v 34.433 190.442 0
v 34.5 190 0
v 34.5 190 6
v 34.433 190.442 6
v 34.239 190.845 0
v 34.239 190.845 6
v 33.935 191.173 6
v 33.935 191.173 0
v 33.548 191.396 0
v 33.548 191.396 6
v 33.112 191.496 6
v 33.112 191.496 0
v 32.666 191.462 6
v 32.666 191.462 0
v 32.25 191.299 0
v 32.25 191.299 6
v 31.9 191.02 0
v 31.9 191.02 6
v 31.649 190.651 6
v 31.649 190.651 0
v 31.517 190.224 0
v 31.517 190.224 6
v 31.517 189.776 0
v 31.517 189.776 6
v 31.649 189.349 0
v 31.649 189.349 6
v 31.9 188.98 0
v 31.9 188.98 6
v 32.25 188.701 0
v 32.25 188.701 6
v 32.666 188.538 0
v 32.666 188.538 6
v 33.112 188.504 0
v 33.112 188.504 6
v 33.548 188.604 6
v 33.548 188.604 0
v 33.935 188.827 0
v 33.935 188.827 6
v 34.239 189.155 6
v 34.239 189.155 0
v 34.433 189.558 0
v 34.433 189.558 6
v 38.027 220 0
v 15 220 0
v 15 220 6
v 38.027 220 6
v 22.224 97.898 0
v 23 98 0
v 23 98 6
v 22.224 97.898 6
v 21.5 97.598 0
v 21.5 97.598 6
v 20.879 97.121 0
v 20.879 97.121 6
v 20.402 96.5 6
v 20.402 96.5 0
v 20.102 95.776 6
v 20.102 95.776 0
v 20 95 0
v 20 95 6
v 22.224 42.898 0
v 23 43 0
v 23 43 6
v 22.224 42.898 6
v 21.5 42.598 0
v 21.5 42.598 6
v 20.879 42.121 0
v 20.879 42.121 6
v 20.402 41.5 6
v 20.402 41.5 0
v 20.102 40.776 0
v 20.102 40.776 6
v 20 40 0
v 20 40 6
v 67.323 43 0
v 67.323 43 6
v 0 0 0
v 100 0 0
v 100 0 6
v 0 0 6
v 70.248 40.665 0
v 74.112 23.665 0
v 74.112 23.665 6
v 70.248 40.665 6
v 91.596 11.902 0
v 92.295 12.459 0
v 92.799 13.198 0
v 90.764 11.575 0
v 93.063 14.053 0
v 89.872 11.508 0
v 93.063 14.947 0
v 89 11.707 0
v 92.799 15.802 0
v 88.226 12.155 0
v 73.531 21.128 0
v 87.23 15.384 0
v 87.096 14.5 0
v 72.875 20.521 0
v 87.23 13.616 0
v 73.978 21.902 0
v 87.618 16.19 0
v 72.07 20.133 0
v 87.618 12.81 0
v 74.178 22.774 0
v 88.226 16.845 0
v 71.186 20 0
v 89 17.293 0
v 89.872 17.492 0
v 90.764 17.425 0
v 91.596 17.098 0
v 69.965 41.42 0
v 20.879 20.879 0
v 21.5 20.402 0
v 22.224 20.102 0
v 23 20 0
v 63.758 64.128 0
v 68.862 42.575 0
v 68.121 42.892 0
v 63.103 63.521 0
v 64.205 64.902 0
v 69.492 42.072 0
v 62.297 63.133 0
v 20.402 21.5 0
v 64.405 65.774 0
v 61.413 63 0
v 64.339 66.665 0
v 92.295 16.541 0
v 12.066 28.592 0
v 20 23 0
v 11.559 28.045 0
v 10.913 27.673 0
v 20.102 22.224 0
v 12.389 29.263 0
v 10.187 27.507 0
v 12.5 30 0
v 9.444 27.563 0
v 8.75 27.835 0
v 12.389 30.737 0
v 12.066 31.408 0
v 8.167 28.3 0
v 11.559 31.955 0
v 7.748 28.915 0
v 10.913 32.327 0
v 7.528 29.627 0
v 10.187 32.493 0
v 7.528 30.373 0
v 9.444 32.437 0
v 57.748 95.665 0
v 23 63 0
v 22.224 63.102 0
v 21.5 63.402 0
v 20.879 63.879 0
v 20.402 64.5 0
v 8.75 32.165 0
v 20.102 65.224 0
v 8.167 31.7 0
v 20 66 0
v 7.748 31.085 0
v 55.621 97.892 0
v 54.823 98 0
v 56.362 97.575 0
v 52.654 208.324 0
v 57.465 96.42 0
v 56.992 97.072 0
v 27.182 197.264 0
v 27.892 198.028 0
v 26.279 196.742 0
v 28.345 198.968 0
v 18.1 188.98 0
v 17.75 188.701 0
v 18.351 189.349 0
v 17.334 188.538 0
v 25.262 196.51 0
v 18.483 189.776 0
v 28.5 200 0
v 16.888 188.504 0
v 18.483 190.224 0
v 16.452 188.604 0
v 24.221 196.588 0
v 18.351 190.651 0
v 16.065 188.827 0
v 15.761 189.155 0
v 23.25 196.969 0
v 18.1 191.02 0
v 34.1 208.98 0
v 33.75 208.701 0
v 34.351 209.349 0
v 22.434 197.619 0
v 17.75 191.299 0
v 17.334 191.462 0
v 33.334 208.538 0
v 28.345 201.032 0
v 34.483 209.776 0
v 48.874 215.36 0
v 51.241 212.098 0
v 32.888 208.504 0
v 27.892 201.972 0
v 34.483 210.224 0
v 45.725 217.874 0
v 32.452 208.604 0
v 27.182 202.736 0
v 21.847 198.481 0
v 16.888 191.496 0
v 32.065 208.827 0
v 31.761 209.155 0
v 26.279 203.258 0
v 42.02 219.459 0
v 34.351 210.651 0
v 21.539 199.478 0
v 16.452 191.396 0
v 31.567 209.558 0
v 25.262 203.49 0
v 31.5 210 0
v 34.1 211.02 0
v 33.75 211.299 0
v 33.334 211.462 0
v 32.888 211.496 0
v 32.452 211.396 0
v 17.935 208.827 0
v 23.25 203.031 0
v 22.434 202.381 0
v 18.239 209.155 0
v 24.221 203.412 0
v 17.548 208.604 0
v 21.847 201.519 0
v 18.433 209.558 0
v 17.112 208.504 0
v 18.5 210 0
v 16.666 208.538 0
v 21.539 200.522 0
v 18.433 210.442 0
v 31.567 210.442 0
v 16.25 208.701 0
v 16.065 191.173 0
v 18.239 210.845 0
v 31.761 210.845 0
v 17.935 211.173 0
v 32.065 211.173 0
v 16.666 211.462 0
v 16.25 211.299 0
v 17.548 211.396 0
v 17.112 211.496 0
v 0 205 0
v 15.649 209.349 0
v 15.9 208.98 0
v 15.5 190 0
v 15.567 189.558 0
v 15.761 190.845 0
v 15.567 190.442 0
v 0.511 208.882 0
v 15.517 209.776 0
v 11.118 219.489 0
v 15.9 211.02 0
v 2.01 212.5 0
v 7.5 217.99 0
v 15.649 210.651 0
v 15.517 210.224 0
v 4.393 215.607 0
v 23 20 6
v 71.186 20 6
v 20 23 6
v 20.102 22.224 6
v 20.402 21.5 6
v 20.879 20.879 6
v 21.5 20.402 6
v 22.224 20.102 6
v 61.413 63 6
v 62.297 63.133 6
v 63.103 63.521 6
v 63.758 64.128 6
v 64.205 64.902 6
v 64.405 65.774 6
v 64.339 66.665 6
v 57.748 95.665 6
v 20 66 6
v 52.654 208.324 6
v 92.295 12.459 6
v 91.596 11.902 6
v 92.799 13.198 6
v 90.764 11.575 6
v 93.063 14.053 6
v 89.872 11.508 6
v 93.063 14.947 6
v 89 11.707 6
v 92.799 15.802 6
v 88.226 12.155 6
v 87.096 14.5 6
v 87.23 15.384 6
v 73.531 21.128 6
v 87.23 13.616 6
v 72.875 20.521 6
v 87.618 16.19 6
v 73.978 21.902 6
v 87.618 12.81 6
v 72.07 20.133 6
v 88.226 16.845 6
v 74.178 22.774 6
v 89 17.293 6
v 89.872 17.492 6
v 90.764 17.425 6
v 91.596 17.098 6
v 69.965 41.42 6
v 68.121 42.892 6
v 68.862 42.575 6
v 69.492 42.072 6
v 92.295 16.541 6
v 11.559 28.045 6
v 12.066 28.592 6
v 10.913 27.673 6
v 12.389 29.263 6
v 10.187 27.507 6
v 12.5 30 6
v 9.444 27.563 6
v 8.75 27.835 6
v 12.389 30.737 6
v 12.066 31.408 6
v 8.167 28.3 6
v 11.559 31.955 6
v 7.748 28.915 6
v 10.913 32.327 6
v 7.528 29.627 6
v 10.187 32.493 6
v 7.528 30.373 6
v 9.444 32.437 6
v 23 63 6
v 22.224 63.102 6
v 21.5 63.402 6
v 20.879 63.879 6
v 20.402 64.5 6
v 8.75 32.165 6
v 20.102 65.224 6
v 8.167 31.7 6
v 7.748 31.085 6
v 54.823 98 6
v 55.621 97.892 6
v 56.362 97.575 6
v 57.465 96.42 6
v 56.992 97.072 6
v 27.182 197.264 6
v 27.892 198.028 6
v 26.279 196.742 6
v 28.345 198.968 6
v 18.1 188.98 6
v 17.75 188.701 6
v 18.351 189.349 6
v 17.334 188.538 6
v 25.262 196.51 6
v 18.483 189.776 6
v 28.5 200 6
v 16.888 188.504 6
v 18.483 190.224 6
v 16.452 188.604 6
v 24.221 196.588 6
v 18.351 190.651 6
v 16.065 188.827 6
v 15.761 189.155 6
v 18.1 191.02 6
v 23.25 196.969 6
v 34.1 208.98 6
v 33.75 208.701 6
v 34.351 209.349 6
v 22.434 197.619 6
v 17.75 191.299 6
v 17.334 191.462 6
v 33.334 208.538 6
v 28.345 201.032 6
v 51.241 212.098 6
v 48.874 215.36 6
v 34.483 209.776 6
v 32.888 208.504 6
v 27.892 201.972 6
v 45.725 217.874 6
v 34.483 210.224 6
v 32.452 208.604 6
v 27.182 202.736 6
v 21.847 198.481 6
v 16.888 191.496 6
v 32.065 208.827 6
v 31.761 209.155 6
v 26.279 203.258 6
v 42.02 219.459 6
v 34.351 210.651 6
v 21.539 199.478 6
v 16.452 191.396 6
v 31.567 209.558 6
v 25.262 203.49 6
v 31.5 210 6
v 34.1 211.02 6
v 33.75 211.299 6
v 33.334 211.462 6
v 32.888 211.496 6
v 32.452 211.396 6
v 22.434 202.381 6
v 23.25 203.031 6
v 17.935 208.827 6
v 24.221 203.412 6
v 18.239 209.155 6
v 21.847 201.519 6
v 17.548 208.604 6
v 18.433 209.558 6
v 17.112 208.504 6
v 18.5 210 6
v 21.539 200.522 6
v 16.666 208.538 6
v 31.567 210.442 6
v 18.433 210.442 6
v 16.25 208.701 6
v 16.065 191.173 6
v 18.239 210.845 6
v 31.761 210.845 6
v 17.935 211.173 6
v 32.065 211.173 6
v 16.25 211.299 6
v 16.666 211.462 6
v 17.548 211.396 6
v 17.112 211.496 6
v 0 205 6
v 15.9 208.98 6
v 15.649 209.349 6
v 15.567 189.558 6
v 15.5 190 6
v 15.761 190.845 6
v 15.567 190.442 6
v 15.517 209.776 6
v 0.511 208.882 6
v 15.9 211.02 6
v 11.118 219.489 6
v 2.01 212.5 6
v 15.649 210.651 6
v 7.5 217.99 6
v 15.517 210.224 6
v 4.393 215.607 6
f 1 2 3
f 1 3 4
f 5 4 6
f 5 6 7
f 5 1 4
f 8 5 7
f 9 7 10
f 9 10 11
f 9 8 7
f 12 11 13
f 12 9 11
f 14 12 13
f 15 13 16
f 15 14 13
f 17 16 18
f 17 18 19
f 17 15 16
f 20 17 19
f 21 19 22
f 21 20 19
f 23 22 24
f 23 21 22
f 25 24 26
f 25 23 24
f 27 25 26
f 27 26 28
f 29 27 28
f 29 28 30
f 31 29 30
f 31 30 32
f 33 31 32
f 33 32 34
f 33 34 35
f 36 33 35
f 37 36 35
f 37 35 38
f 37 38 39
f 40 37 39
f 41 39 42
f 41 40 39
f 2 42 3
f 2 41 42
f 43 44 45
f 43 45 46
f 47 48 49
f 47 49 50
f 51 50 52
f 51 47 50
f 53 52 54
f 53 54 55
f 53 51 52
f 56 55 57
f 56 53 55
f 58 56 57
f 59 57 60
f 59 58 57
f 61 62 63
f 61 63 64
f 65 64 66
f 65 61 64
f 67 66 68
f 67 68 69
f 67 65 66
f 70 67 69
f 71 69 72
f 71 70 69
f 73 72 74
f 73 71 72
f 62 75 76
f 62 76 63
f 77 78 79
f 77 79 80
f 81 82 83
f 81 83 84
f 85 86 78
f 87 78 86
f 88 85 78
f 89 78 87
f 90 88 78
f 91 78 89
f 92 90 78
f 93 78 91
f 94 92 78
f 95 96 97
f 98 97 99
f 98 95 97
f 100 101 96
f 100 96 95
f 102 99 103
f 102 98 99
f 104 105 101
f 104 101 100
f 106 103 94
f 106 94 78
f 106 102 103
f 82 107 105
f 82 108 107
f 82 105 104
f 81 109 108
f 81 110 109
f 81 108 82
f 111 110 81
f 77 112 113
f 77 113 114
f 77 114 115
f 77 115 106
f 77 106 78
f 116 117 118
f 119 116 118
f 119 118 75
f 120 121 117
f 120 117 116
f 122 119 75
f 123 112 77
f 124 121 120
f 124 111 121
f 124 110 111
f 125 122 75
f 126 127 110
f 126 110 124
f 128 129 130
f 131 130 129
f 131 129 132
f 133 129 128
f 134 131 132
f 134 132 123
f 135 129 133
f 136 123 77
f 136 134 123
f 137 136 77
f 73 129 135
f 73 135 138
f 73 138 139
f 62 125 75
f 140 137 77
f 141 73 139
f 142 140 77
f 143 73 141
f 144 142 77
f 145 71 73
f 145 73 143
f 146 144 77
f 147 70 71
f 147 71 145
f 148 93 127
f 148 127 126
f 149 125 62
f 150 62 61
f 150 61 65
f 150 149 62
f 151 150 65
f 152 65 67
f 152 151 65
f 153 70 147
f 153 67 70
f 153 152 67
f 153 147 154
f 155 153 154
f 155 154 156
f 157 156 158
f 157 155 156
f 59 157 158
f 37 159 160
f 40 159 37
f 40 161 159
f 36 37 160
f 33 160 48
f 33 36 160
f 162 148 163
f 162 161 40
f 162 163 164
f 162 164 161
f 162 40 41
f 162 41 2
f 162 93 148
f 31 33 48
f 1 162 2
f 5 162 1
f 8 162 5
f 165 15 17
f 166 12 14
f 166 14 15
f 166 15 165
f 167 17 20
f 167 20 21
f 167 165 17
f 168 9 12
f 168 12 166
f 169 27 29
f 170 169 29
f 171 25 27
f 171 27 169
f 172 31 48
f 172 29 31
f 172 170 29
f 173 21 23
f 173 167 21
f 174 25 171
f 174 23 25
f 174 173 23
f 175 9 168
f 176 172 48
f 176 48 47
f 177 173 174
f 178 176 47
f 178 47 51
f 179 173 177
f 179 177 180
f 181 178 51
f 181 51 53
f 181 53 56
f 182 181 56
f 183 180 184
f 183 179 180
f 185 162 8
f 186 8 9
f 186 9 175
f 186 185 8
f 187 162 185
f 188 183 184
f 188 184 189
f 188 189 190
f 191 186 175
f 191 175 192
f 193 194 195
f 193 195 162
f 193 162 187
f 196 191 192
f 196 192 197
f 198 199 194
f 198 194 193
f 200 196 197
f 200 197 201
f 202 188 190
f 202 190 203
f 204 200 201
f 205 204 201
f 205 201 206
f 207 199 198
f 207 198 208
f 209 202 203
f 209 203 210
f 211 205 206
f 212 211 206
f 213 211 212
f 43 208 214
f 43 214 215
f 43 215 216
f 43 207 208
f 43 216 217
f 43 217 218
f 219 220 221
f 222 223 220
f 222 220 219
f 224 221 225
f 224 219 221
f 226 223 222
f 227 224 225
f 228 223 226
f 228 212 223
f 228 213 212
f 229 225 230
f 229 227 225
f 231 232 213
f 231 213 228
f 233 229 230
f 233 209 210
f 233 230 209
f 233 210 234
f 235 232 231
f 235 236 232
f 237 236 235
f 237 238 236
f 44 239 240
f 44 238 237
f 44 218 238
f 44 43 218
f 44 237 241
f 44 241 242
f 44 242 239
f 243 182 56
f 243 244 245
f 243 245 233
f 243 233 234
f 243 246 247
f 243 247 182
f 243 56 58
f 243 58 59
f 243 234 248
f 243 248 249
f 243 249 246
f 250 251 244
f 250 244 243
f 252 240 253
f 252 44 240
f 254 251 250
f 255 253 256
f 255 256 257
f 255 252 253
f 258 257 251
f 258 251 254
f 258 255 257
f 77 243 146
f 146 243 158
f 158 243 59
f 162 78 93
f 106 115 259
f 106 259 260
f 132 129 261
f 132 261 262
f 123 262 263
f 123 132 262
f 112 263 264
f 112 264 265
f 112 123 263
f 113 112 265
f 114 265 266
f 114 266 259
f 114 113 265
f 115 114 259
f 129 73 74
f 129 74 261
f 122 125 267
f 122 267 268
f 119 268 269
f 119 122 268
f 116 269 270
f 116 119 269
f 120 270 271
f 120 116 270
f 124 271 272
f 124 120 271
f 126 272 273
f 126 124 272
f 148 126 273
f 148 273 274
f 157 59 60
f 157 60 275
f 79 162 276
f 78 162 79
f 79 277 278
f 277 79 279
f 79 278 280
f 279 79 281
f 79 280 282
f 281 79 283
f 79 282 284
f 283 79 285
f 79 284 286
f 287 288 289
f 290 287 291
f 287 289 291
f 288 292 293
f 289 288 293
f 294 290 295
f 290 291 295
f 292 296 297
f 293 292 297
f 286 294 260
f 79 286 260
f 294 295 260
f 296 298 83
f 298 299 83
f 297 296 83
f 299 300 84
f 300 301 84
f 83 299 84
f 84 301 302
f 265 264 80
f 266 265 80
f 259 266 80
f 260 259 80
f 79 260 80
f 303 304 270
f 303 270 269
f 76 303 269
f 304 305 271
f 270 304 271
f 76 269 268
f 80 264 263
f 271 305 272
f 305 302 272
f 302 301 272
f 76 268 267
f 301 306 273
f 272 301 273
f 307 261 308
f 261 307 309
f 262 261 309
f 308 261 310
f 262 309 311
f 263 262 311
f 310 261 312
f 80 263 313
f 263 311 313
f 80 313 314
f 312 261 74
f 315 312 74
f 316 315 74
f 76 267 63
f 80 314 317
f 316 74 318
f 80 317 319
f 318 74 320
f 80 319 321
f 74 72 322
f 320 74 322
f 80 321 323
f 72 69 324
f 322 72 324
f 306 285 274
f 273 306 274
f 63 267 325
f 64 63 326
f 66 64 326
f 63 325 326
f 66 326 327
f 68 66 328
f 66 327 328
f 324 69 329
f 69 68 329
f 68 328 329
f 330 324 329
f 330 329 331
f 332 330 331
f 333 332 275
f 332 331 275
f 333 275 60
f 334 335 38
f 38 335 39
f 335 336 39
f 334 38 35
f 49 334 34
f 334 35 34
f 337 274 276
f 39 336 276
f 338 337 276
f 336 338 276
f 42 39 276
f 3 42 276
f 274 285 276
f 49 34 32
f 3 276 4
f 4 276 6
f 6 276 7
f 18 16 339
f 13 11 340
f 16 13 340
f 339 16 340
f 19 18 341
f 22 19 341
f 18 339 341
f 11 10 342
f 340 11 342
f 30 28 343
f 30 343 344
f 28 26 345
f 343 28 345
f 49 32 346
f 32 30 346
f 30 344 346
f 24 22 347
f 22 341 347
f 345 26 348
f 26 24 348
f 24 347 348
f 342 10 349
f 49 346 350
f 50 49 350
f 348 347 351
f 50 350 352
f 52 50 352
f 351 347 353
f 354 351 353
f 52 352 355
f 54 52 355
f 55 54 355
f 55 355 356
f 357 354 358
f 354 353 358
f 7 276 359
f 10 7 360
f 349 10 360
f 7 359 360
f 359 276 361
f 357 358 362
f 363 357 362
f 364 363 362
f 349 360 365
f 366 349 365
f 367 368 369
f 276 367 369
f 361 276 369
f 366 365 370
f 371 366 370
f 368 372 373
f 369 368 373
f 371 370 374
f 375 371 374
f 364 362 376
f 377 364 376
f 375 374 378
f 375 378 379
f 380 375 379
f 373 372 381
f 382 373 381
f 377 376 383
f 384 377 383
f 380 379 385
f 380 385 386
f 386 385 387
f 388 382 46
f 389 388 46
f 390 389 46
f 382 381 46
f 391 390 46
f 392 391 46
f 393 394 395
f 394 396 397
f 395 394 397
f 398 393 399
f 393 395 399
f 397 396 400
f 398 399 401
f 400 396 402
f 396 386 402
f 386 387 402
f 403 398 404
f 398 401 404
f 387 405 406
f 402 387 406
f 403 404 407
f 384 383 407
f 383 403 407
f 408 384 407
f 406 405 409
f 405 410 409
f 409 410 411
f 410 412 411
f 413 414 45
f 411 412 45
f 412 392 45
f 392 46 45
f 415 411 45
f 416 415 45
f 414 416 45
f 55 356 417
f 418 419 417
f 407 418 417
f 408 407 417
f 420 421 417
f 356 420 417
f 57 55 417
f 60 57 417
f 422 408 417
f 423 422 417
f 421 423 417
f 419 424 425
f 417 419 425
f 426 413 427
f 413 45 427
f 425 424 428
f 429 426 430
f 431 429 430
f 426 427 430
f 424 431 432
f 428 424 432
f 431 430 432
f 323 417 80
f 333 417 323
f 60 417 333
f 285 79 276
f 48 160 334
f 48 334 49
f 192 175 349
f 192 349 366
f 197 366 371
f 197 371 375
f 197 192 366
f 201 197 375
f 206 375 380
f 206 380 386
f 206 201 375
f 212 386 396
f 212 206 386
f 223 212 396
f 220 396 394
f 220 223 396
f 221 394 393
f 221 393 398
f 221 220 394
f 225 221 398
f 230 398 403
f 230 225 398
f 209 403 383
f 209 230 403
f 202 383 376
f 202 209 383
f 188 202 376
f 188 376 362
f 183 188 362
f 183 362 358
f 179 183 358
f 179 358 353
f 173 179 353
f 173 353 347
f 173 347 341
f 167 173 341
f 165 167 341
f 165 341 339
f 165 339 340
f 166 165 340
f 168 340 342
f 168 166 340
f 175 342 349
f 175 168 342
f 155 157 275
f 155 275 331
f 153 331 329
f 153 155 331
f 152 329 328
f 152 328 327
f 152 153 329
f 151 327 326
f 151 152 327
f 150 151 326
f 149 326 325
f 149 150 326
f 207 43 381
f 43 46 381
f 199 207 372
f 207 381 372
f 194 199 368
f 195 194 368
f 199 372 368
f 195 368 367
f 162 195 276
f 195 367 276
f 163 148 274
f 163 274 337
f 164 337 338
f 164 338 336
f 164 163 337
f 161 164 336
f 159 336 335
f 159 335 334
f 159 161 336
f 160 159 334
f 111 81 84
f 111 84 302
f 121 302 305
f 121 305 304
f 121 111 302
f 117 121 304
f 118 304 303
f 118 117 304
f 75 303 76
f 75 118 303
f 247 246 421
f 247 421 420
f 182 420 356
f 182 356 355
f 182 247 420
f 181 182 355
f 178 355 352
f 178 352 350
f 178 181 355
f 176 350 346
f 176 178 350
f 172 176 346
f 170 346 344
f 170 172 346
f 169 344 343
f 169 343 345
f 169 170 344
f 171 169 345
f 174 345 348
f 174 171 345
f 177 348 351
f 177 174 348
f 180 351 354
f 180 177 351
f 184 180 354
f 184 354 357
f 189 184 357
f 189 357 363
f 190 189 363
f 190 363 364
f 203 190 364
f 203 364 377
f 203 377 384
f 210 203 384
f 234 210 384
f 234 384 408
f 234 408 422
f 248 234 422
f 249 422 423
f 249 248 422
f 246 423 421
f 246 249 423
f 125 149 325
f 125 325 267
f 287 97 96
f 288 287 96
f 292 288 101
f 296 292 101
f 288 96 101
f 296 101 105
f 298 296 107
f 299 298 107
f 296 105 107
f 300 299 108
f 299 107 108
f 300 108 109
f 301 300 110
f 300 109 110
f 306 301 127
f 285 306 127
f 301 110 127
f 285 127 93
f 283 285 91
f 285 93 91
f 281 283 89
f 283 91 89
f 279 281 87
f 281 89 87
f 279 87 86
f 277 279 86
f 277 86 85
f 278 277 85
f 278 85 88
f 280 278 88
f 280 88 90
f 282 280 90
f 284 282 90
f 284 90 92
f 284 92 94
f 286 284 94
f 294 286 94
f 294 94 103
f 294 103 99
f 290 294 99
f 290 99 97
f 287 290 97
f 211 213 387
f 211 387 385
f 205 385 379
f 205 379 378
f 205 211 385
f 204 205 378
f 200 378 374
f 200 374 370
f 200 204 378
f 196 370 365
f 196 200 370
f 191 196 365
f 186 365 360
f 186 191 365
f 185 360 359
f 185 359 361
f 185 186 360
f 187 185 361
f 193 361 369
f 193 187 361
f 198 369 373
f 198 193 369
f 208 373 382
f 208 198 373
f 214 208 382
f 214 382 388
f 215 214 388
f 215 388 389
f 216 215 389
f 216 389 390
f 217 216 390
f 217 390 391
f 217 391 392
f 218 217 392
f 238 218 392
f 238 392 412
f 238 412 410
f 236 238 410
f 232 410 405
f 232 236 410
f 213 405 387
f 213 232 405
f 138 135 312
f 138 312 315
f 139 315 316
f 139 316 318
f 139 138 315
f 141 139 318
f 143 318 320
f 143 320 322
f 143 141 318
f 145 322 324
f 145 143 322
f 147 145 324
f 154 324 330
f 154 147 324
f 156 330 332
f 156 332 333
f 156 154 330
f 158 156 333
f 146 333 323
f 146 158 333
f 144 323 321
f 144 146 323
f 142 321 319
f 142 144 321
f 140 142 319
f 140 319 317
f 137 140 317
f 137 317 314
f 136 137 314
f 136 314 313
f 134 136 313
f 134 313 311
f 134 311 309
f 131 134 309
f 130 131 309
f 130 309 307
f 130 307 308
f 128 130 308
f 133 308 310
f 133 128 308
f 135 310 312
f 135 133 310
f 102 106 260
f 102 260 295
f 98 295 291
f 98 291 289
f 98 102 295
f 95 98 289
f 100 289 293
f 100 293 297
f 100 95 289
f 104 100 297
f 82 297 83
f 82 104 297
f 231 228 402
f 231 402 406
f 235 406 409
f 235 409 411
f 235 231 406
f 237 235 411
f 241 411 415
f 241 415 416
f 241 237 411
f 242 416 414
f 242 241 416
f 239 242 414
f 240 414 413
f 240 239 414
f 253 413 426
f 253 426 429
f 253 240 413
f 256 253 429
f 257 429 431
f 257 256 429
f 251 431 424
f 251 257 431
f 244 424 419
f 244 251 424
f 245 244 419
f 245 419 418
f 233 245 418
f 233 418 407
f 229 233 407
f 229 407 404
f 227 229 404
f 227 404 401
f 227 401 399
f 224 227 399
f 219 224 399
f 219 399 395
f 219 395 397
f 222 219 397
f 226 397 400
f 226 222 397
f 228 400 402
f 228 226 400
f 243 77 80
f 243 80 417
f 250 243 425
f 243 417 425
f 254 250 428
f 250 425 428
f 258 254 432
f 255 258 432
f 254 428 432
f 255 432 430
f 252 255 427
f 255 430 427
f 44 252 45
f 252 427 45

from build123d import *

# Parameters (mm, degrees)
ESBO_O1_R                = 1.5
ESBO_O1_R_2              = 3.5
ESBO_O1_R_3              = 2.5
RESSALTO_EXTRUS_O2_DEPTH = 6
FILETE1_R                = 15
ESBO_O2_R                = 3
CORTE_EXTRUS_O1_DEPTH    = 10


with BuildPart() as part:
    # Esboço1 → Ressalto-extrusão2 (new body)
    with BuildSketch(Plane.XY):
        Polygon((0, 0), (0, 220), (50, 220), (100, 0), align=None)
        with Locations((17, 210)):
            Circle(ESBO_O1_R, mode=Mode.SUBTRACT)
        with Locations(Location((33, 210, 0), (0, 0, 180))):
            Circle(ESBO_O1_R, mode=Mode.SUBTRACT)
        with Locations((33, 190)):
            Circle(ESBO_O1_R, mode=Mode.SUBTRACT)
        with Locations(Location((17, 190, 0), (0, 0, 180))):
            Circle(ESBO_O1_R, mode=Mode.SUBTRACT)
        with Locations((25, 200)):
            Circle(ESBO_O1_R_2, mode=Mode.SUBTRACT)
        with Locations((10, 30)):
            Circle(ESBO_O1_R_3, mode=Mode.SUBTRACT)
        with BuildLine():
            Line((20, 95), (20, 66))
            ThreePointArc((20, 66), (20.878679656, 63.878679656), (23, 63))
            Line((23, 63), (61.413470366, 63))
            ThreePointArc((61.413470366, 63), (63.75810146, 64.128448496), (64.338868934, 66.664863311))
            Line((64.338868934, 66.664863311), (57.747959843, 95.664863311))
            ThreePointArc((57.747959843, 95.664863311), (56.69411278, 97.344631094), (54.822561275, 98))
            Line((54.822561275, 98), (23, 98))
            ThreePointArc((23, 98), (20.878679656, 97.121320344), (20, 95))
        make_face(mode=Mode.SUBTRACT)
        with BuildLine():
            Line((20, 40), (20, 23))
            ThreePointArc((20, 23), (20.878679656, 20.878679656), (23, 20))
            Line((23, 20), (71.186197639, 20))
            ThreePointArc((71.186197639, 20), (73.530828733, 21.128448496), (74.111596206, 23.664863311))
            Line((74.111596206, 23.664863311), (70.247959843, 40.664863311))
            ThreePointArc((70.247959843, 40.664863311), (69.19411278, 42.344631094), (67.322561275, 43))
            Line((67.322561275, 43), (23, 43))
            ThreePointArc((23, 43), (20.878679656, 42.121320344), (20, 40))
        make_face(mode=Mode.SUBTRACT)
    extrude(amount=RESSALTO_EXTRUS_O2_DEPTH)

    # Filete1
    filete1_edges = [part.edges().sort_by_distance(p)[0] for p in [
        (0, 220, 3),
        (50, 220, 3),
    ]]
    fillet(filete1_edges, radius=FILETE1_R)

    # Esboço2 → Corte-extrusão1 (cut)
    with BuildSketch(Plane(origin=(0, 0, 0), x_dir=(-1, 0, 0), z_dir=(0, 0, -1))):
        with Locations((-90.096252795, 14.5)):
            Circle(ESBO_O2_R)
    extrude(amount=-CORTE_EXTRUS_O1_DEPTH, mode=Mode.SUBTRACT)


solid = part.part
